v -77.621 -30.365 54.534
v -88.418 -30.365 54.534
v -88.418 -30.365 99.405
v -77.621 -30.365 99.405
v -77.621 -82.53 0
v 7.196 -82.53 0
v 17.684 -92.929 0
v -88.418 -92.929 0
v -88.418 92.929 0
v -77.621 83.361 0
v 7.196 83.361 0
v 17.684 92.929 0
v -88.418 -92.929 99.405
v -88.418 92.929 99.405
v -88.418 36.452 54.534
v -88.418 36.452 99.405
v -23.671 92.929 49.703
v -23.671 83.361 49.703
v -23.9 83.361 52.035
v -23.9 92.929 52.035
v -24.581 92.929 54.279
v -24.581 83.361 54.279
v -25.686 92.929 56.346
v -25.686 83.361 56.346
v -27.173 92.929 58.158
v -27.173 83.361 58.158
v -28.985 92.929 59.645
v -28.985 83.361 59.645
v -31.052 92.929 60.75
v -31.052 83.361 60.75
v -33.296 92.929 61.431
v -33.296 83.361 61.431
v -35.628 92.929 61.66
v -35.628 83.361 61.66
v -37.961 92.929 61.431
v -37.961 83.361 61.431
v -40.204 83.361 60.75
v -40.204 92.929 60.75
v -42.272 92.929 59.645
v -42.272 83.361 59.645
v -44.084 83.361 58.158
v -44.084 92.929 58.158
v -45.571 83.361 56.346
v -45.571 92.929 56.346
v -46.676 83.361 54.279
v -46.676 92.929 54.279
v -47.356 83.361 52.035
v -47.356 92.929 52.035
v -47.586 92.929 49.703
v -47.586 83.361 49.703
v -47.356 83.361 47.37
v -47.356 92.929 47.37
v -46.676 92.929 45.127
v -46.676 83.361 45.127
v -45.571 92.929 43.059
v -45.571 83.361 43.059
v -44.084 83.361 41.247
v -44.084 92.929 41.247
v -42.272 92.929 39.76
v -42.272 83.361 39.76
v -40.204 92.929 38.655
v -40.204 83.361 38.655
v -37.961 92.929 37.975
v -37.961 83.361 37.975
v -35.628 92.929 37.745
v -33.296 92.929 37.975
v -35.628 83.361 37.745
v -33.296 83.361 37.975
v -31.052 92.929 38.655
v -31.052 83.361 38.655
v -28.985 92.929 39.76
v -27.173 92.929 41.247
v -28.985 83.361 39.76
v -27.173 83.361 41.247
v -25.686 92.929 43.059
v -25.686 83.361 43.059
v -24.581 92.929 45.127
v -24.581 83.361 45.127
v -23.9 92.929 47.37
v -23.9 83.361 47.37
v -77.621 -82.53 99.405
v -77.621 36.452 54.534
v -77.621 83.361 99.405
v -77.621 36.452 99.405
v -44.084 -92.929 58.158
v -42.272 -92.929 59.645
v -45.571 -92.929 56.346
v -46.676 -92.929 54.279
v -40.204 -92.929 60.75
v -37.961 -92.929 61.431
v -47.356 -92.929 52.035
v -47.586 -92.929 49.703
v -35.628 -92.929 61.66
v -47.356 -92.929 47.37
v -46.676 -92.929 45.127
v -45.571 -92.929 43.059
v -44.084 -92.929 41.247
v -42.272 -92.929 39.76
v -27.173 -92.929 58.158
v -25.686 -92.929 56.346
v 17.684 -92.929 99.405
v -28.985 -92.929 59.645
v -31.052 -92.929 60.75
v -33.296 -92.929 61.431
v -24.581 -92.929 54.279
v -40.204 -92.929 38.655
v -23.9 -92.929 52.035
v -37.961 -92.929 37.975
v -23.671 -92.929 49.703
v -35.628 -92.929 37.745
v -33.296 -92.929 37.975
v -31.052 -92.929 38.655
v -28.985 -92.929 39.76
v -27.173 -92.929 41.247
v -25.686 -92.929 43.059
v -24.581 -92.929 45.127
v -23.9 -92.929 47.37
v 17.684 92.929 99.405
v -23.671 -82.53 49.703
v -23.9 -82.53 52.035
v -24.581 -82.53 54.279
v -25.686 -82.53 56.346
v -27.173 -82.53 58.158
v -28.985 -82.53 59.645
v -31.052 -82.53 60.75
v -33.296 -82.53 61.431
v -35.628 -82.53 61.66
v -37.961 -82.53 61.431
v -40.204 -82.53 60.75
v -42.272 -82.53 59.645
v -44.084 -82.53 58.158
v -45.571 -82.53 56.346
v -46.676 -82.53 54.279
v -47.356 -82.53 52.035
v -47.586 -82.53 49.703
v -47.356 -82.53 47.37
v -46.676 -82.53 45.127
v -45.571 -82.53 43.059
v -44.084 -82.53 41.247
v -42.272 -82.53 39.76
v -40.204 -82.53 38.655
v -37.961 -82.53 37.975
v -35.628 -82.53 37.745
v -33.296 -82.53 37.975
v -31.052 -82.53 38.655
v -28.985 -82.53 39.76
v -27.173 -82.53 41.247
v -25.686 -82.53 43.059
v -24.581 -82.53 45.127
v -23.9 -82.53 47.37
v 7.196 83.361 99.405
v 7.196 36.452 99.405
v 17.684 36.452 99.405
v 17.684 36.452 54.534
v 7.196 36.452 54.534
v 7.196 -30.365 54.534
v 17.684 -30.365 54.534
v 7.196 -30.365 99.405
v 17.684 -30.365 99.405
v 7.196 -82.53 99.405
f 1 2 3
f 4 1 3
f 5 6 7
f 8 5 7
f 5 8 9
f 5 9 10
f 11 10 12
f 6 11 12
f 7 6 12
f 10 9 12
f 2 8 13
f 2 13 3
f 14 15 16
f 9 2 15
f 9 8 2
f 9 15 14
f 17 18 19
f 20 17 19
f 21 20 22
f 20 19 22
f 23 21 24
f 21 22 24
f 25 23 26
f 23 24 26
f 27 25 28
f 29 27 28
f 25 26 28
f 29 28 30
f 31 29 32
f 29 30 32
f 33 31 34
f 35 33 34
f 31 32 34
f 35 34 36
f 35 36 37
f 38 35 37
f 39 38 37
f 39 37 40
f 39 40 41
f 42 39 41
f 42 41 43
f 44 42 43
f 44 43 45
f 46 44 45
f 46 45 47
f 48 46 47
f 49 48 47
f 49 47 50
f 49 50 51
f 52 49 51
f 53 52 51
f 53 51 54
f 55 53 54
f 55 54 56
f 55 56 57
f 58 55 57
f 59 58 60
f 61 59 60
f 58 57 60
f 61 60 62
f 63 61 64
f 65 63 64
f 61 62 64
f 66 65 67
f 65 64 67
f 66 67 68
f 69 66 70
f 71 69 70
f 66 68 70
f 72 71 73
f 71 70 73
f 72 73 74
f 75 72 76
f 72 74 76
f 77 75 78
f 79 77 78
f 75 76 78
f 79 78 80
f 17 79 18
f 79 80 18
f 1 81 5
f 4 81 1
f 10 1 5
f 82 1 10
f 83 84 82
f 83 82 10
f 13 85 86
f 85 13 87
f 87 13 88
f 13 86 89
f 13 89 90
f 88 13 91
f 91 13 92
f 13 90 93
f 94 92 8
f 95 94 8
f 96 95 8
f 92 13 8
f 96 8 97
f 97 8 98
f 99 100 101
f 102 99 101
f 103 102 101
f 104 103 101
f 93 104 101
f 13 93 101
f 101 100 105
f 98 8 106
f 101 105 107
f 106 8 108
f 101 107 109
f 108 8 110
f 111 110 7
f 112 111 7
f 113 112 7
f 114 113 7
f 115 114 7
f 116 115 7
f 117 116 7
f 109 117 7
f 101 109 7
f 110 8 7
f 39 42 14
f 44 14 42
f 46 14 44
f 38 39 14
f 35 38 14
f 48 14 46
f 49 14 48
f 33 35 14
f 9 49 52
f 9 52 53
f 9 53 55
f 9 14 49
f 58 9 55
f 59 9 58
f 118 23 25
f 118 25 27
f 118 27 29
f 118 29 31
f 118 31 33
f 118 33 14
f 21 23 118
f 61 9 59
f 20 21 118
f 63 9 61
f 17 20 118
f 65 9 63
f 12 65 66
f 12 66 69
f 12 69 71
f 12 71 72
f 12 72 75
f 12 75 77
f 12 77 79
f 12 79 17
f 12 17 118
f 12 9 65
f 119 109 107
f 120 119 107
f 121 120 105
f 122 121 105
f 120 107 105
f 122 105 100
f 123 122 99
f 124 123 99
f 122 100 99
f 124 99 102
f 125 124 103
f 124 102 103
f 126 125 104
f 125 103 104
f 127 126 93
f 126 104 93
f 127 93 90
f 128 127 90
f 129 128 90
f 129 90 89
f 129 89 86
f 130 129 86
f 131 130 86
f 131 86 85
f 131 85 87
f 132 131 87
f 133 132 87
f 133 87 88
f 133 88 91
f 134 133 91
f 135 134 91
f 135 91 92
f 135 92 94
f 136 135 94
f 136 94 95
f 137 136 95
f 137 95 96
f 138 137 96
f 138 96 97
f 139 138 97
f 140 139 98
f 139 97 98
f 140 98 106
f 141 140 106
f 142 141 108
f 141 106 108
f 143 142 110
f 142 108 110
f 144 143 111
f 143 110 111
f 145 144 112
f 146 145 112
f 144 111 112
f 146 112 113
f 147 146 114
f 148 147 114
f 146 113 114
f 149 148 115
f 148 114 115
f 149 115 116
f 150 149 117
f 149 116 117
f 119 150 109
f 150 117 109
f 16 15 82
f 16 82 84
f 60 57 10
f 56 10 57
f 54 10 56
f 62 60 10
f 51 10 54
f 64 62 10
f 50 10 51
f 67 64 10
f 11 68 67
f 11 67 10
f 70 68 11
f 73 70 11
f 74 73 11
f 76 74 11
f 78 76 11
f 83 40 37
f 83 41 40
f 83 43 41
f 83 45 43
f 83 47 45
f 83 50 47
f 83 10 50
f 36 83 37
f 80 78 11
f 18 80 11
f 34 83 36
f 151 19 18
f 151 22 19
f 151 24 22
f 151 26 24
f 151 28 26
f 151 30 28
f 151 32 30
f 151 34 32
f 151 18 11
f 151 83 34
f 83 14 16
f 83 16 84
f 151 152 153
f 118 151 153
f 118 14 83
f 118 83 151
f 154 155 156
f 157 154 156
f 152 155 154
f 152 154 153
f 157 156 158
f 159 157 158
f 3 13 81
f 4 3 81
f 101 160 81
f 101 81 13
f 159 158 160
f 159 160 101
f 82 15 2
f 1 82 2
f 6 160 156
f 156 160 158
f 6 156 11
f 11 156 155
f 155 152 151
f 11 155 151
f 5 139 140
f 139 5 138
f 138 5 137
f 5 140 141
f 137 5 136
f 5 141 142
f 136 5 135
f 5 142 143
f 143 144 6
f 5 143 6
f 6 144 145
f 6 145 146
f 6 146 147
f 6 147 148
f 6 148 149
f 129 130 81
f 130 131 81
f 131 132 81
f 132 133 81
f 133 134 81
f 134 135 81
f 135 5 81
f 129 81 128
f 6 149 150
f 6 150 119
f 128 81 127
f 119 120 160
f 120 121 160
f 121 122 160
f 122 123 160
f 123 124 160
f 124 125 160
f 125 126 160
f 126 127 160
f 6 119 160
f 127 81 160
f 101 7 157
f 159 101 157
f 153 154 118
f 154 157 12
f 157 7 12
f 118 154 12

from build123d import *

# Parameters (mm, degrees)
F0_W     = 106.1013787985
F0_H     = 185.8578324318
F1_DEPTH = 99.4051918387
F2_R     = 11.9577926149
F3_DEPTH = 185.8588324318
F4_W     = 66.8169781566
F4_H     = 44.8713488877
F5_DEPTH = 106.1023787985
F6_W     = 84.8165526986
F6_H     = 165.8911928535
F7_DEPTH = 99.4061918387


with BuildPart() as f1:
    # F0 (on Top) → F1 (new body)
    with BuildSketch(Plane.XY):
        with Locations((-35.3671237826, 0)):
            Rectangle(F0_W, F0_H)
    extrude(amount=F1_DEPTH)

    # F2 (on face) → F3 (cut, through all)
    with BuildSketch(Plane.XZ.offset(92.9289162159)):
        with Locations((-35.6283932924, 49.7025959194)):
            Circle(F2_R)
    extrude(amount=-F3_DEPTH, mode=Mode.SUBTRACT)

    # F4 (on face) → F5 (cut, through all)
    with BuildSketch(Plane(origin=(-88.4178131819, 0, 0), x_dir=(0, -1, 0), z_dir=(-1, 0, 0))):
        with Locations((-3.043372184, 76.9695173949)):
            Rectangle(F4_W, F4_H)
    extrude(amount=-F5_DEPTH, mode=Mode.SUBTRACT)

    # F6 (on face) → F7 (cut, through all)
    with BuildSketch(Plane.XY.offset(99.4051918387)):
        with Locations((-35.2126248181, 0.4157535732)):
            Rectangle(F6_W, F6_H)
    extrude(amount=-F7_DEPTH, mode=Mode.SUBTRACT)


solid = f1.part
